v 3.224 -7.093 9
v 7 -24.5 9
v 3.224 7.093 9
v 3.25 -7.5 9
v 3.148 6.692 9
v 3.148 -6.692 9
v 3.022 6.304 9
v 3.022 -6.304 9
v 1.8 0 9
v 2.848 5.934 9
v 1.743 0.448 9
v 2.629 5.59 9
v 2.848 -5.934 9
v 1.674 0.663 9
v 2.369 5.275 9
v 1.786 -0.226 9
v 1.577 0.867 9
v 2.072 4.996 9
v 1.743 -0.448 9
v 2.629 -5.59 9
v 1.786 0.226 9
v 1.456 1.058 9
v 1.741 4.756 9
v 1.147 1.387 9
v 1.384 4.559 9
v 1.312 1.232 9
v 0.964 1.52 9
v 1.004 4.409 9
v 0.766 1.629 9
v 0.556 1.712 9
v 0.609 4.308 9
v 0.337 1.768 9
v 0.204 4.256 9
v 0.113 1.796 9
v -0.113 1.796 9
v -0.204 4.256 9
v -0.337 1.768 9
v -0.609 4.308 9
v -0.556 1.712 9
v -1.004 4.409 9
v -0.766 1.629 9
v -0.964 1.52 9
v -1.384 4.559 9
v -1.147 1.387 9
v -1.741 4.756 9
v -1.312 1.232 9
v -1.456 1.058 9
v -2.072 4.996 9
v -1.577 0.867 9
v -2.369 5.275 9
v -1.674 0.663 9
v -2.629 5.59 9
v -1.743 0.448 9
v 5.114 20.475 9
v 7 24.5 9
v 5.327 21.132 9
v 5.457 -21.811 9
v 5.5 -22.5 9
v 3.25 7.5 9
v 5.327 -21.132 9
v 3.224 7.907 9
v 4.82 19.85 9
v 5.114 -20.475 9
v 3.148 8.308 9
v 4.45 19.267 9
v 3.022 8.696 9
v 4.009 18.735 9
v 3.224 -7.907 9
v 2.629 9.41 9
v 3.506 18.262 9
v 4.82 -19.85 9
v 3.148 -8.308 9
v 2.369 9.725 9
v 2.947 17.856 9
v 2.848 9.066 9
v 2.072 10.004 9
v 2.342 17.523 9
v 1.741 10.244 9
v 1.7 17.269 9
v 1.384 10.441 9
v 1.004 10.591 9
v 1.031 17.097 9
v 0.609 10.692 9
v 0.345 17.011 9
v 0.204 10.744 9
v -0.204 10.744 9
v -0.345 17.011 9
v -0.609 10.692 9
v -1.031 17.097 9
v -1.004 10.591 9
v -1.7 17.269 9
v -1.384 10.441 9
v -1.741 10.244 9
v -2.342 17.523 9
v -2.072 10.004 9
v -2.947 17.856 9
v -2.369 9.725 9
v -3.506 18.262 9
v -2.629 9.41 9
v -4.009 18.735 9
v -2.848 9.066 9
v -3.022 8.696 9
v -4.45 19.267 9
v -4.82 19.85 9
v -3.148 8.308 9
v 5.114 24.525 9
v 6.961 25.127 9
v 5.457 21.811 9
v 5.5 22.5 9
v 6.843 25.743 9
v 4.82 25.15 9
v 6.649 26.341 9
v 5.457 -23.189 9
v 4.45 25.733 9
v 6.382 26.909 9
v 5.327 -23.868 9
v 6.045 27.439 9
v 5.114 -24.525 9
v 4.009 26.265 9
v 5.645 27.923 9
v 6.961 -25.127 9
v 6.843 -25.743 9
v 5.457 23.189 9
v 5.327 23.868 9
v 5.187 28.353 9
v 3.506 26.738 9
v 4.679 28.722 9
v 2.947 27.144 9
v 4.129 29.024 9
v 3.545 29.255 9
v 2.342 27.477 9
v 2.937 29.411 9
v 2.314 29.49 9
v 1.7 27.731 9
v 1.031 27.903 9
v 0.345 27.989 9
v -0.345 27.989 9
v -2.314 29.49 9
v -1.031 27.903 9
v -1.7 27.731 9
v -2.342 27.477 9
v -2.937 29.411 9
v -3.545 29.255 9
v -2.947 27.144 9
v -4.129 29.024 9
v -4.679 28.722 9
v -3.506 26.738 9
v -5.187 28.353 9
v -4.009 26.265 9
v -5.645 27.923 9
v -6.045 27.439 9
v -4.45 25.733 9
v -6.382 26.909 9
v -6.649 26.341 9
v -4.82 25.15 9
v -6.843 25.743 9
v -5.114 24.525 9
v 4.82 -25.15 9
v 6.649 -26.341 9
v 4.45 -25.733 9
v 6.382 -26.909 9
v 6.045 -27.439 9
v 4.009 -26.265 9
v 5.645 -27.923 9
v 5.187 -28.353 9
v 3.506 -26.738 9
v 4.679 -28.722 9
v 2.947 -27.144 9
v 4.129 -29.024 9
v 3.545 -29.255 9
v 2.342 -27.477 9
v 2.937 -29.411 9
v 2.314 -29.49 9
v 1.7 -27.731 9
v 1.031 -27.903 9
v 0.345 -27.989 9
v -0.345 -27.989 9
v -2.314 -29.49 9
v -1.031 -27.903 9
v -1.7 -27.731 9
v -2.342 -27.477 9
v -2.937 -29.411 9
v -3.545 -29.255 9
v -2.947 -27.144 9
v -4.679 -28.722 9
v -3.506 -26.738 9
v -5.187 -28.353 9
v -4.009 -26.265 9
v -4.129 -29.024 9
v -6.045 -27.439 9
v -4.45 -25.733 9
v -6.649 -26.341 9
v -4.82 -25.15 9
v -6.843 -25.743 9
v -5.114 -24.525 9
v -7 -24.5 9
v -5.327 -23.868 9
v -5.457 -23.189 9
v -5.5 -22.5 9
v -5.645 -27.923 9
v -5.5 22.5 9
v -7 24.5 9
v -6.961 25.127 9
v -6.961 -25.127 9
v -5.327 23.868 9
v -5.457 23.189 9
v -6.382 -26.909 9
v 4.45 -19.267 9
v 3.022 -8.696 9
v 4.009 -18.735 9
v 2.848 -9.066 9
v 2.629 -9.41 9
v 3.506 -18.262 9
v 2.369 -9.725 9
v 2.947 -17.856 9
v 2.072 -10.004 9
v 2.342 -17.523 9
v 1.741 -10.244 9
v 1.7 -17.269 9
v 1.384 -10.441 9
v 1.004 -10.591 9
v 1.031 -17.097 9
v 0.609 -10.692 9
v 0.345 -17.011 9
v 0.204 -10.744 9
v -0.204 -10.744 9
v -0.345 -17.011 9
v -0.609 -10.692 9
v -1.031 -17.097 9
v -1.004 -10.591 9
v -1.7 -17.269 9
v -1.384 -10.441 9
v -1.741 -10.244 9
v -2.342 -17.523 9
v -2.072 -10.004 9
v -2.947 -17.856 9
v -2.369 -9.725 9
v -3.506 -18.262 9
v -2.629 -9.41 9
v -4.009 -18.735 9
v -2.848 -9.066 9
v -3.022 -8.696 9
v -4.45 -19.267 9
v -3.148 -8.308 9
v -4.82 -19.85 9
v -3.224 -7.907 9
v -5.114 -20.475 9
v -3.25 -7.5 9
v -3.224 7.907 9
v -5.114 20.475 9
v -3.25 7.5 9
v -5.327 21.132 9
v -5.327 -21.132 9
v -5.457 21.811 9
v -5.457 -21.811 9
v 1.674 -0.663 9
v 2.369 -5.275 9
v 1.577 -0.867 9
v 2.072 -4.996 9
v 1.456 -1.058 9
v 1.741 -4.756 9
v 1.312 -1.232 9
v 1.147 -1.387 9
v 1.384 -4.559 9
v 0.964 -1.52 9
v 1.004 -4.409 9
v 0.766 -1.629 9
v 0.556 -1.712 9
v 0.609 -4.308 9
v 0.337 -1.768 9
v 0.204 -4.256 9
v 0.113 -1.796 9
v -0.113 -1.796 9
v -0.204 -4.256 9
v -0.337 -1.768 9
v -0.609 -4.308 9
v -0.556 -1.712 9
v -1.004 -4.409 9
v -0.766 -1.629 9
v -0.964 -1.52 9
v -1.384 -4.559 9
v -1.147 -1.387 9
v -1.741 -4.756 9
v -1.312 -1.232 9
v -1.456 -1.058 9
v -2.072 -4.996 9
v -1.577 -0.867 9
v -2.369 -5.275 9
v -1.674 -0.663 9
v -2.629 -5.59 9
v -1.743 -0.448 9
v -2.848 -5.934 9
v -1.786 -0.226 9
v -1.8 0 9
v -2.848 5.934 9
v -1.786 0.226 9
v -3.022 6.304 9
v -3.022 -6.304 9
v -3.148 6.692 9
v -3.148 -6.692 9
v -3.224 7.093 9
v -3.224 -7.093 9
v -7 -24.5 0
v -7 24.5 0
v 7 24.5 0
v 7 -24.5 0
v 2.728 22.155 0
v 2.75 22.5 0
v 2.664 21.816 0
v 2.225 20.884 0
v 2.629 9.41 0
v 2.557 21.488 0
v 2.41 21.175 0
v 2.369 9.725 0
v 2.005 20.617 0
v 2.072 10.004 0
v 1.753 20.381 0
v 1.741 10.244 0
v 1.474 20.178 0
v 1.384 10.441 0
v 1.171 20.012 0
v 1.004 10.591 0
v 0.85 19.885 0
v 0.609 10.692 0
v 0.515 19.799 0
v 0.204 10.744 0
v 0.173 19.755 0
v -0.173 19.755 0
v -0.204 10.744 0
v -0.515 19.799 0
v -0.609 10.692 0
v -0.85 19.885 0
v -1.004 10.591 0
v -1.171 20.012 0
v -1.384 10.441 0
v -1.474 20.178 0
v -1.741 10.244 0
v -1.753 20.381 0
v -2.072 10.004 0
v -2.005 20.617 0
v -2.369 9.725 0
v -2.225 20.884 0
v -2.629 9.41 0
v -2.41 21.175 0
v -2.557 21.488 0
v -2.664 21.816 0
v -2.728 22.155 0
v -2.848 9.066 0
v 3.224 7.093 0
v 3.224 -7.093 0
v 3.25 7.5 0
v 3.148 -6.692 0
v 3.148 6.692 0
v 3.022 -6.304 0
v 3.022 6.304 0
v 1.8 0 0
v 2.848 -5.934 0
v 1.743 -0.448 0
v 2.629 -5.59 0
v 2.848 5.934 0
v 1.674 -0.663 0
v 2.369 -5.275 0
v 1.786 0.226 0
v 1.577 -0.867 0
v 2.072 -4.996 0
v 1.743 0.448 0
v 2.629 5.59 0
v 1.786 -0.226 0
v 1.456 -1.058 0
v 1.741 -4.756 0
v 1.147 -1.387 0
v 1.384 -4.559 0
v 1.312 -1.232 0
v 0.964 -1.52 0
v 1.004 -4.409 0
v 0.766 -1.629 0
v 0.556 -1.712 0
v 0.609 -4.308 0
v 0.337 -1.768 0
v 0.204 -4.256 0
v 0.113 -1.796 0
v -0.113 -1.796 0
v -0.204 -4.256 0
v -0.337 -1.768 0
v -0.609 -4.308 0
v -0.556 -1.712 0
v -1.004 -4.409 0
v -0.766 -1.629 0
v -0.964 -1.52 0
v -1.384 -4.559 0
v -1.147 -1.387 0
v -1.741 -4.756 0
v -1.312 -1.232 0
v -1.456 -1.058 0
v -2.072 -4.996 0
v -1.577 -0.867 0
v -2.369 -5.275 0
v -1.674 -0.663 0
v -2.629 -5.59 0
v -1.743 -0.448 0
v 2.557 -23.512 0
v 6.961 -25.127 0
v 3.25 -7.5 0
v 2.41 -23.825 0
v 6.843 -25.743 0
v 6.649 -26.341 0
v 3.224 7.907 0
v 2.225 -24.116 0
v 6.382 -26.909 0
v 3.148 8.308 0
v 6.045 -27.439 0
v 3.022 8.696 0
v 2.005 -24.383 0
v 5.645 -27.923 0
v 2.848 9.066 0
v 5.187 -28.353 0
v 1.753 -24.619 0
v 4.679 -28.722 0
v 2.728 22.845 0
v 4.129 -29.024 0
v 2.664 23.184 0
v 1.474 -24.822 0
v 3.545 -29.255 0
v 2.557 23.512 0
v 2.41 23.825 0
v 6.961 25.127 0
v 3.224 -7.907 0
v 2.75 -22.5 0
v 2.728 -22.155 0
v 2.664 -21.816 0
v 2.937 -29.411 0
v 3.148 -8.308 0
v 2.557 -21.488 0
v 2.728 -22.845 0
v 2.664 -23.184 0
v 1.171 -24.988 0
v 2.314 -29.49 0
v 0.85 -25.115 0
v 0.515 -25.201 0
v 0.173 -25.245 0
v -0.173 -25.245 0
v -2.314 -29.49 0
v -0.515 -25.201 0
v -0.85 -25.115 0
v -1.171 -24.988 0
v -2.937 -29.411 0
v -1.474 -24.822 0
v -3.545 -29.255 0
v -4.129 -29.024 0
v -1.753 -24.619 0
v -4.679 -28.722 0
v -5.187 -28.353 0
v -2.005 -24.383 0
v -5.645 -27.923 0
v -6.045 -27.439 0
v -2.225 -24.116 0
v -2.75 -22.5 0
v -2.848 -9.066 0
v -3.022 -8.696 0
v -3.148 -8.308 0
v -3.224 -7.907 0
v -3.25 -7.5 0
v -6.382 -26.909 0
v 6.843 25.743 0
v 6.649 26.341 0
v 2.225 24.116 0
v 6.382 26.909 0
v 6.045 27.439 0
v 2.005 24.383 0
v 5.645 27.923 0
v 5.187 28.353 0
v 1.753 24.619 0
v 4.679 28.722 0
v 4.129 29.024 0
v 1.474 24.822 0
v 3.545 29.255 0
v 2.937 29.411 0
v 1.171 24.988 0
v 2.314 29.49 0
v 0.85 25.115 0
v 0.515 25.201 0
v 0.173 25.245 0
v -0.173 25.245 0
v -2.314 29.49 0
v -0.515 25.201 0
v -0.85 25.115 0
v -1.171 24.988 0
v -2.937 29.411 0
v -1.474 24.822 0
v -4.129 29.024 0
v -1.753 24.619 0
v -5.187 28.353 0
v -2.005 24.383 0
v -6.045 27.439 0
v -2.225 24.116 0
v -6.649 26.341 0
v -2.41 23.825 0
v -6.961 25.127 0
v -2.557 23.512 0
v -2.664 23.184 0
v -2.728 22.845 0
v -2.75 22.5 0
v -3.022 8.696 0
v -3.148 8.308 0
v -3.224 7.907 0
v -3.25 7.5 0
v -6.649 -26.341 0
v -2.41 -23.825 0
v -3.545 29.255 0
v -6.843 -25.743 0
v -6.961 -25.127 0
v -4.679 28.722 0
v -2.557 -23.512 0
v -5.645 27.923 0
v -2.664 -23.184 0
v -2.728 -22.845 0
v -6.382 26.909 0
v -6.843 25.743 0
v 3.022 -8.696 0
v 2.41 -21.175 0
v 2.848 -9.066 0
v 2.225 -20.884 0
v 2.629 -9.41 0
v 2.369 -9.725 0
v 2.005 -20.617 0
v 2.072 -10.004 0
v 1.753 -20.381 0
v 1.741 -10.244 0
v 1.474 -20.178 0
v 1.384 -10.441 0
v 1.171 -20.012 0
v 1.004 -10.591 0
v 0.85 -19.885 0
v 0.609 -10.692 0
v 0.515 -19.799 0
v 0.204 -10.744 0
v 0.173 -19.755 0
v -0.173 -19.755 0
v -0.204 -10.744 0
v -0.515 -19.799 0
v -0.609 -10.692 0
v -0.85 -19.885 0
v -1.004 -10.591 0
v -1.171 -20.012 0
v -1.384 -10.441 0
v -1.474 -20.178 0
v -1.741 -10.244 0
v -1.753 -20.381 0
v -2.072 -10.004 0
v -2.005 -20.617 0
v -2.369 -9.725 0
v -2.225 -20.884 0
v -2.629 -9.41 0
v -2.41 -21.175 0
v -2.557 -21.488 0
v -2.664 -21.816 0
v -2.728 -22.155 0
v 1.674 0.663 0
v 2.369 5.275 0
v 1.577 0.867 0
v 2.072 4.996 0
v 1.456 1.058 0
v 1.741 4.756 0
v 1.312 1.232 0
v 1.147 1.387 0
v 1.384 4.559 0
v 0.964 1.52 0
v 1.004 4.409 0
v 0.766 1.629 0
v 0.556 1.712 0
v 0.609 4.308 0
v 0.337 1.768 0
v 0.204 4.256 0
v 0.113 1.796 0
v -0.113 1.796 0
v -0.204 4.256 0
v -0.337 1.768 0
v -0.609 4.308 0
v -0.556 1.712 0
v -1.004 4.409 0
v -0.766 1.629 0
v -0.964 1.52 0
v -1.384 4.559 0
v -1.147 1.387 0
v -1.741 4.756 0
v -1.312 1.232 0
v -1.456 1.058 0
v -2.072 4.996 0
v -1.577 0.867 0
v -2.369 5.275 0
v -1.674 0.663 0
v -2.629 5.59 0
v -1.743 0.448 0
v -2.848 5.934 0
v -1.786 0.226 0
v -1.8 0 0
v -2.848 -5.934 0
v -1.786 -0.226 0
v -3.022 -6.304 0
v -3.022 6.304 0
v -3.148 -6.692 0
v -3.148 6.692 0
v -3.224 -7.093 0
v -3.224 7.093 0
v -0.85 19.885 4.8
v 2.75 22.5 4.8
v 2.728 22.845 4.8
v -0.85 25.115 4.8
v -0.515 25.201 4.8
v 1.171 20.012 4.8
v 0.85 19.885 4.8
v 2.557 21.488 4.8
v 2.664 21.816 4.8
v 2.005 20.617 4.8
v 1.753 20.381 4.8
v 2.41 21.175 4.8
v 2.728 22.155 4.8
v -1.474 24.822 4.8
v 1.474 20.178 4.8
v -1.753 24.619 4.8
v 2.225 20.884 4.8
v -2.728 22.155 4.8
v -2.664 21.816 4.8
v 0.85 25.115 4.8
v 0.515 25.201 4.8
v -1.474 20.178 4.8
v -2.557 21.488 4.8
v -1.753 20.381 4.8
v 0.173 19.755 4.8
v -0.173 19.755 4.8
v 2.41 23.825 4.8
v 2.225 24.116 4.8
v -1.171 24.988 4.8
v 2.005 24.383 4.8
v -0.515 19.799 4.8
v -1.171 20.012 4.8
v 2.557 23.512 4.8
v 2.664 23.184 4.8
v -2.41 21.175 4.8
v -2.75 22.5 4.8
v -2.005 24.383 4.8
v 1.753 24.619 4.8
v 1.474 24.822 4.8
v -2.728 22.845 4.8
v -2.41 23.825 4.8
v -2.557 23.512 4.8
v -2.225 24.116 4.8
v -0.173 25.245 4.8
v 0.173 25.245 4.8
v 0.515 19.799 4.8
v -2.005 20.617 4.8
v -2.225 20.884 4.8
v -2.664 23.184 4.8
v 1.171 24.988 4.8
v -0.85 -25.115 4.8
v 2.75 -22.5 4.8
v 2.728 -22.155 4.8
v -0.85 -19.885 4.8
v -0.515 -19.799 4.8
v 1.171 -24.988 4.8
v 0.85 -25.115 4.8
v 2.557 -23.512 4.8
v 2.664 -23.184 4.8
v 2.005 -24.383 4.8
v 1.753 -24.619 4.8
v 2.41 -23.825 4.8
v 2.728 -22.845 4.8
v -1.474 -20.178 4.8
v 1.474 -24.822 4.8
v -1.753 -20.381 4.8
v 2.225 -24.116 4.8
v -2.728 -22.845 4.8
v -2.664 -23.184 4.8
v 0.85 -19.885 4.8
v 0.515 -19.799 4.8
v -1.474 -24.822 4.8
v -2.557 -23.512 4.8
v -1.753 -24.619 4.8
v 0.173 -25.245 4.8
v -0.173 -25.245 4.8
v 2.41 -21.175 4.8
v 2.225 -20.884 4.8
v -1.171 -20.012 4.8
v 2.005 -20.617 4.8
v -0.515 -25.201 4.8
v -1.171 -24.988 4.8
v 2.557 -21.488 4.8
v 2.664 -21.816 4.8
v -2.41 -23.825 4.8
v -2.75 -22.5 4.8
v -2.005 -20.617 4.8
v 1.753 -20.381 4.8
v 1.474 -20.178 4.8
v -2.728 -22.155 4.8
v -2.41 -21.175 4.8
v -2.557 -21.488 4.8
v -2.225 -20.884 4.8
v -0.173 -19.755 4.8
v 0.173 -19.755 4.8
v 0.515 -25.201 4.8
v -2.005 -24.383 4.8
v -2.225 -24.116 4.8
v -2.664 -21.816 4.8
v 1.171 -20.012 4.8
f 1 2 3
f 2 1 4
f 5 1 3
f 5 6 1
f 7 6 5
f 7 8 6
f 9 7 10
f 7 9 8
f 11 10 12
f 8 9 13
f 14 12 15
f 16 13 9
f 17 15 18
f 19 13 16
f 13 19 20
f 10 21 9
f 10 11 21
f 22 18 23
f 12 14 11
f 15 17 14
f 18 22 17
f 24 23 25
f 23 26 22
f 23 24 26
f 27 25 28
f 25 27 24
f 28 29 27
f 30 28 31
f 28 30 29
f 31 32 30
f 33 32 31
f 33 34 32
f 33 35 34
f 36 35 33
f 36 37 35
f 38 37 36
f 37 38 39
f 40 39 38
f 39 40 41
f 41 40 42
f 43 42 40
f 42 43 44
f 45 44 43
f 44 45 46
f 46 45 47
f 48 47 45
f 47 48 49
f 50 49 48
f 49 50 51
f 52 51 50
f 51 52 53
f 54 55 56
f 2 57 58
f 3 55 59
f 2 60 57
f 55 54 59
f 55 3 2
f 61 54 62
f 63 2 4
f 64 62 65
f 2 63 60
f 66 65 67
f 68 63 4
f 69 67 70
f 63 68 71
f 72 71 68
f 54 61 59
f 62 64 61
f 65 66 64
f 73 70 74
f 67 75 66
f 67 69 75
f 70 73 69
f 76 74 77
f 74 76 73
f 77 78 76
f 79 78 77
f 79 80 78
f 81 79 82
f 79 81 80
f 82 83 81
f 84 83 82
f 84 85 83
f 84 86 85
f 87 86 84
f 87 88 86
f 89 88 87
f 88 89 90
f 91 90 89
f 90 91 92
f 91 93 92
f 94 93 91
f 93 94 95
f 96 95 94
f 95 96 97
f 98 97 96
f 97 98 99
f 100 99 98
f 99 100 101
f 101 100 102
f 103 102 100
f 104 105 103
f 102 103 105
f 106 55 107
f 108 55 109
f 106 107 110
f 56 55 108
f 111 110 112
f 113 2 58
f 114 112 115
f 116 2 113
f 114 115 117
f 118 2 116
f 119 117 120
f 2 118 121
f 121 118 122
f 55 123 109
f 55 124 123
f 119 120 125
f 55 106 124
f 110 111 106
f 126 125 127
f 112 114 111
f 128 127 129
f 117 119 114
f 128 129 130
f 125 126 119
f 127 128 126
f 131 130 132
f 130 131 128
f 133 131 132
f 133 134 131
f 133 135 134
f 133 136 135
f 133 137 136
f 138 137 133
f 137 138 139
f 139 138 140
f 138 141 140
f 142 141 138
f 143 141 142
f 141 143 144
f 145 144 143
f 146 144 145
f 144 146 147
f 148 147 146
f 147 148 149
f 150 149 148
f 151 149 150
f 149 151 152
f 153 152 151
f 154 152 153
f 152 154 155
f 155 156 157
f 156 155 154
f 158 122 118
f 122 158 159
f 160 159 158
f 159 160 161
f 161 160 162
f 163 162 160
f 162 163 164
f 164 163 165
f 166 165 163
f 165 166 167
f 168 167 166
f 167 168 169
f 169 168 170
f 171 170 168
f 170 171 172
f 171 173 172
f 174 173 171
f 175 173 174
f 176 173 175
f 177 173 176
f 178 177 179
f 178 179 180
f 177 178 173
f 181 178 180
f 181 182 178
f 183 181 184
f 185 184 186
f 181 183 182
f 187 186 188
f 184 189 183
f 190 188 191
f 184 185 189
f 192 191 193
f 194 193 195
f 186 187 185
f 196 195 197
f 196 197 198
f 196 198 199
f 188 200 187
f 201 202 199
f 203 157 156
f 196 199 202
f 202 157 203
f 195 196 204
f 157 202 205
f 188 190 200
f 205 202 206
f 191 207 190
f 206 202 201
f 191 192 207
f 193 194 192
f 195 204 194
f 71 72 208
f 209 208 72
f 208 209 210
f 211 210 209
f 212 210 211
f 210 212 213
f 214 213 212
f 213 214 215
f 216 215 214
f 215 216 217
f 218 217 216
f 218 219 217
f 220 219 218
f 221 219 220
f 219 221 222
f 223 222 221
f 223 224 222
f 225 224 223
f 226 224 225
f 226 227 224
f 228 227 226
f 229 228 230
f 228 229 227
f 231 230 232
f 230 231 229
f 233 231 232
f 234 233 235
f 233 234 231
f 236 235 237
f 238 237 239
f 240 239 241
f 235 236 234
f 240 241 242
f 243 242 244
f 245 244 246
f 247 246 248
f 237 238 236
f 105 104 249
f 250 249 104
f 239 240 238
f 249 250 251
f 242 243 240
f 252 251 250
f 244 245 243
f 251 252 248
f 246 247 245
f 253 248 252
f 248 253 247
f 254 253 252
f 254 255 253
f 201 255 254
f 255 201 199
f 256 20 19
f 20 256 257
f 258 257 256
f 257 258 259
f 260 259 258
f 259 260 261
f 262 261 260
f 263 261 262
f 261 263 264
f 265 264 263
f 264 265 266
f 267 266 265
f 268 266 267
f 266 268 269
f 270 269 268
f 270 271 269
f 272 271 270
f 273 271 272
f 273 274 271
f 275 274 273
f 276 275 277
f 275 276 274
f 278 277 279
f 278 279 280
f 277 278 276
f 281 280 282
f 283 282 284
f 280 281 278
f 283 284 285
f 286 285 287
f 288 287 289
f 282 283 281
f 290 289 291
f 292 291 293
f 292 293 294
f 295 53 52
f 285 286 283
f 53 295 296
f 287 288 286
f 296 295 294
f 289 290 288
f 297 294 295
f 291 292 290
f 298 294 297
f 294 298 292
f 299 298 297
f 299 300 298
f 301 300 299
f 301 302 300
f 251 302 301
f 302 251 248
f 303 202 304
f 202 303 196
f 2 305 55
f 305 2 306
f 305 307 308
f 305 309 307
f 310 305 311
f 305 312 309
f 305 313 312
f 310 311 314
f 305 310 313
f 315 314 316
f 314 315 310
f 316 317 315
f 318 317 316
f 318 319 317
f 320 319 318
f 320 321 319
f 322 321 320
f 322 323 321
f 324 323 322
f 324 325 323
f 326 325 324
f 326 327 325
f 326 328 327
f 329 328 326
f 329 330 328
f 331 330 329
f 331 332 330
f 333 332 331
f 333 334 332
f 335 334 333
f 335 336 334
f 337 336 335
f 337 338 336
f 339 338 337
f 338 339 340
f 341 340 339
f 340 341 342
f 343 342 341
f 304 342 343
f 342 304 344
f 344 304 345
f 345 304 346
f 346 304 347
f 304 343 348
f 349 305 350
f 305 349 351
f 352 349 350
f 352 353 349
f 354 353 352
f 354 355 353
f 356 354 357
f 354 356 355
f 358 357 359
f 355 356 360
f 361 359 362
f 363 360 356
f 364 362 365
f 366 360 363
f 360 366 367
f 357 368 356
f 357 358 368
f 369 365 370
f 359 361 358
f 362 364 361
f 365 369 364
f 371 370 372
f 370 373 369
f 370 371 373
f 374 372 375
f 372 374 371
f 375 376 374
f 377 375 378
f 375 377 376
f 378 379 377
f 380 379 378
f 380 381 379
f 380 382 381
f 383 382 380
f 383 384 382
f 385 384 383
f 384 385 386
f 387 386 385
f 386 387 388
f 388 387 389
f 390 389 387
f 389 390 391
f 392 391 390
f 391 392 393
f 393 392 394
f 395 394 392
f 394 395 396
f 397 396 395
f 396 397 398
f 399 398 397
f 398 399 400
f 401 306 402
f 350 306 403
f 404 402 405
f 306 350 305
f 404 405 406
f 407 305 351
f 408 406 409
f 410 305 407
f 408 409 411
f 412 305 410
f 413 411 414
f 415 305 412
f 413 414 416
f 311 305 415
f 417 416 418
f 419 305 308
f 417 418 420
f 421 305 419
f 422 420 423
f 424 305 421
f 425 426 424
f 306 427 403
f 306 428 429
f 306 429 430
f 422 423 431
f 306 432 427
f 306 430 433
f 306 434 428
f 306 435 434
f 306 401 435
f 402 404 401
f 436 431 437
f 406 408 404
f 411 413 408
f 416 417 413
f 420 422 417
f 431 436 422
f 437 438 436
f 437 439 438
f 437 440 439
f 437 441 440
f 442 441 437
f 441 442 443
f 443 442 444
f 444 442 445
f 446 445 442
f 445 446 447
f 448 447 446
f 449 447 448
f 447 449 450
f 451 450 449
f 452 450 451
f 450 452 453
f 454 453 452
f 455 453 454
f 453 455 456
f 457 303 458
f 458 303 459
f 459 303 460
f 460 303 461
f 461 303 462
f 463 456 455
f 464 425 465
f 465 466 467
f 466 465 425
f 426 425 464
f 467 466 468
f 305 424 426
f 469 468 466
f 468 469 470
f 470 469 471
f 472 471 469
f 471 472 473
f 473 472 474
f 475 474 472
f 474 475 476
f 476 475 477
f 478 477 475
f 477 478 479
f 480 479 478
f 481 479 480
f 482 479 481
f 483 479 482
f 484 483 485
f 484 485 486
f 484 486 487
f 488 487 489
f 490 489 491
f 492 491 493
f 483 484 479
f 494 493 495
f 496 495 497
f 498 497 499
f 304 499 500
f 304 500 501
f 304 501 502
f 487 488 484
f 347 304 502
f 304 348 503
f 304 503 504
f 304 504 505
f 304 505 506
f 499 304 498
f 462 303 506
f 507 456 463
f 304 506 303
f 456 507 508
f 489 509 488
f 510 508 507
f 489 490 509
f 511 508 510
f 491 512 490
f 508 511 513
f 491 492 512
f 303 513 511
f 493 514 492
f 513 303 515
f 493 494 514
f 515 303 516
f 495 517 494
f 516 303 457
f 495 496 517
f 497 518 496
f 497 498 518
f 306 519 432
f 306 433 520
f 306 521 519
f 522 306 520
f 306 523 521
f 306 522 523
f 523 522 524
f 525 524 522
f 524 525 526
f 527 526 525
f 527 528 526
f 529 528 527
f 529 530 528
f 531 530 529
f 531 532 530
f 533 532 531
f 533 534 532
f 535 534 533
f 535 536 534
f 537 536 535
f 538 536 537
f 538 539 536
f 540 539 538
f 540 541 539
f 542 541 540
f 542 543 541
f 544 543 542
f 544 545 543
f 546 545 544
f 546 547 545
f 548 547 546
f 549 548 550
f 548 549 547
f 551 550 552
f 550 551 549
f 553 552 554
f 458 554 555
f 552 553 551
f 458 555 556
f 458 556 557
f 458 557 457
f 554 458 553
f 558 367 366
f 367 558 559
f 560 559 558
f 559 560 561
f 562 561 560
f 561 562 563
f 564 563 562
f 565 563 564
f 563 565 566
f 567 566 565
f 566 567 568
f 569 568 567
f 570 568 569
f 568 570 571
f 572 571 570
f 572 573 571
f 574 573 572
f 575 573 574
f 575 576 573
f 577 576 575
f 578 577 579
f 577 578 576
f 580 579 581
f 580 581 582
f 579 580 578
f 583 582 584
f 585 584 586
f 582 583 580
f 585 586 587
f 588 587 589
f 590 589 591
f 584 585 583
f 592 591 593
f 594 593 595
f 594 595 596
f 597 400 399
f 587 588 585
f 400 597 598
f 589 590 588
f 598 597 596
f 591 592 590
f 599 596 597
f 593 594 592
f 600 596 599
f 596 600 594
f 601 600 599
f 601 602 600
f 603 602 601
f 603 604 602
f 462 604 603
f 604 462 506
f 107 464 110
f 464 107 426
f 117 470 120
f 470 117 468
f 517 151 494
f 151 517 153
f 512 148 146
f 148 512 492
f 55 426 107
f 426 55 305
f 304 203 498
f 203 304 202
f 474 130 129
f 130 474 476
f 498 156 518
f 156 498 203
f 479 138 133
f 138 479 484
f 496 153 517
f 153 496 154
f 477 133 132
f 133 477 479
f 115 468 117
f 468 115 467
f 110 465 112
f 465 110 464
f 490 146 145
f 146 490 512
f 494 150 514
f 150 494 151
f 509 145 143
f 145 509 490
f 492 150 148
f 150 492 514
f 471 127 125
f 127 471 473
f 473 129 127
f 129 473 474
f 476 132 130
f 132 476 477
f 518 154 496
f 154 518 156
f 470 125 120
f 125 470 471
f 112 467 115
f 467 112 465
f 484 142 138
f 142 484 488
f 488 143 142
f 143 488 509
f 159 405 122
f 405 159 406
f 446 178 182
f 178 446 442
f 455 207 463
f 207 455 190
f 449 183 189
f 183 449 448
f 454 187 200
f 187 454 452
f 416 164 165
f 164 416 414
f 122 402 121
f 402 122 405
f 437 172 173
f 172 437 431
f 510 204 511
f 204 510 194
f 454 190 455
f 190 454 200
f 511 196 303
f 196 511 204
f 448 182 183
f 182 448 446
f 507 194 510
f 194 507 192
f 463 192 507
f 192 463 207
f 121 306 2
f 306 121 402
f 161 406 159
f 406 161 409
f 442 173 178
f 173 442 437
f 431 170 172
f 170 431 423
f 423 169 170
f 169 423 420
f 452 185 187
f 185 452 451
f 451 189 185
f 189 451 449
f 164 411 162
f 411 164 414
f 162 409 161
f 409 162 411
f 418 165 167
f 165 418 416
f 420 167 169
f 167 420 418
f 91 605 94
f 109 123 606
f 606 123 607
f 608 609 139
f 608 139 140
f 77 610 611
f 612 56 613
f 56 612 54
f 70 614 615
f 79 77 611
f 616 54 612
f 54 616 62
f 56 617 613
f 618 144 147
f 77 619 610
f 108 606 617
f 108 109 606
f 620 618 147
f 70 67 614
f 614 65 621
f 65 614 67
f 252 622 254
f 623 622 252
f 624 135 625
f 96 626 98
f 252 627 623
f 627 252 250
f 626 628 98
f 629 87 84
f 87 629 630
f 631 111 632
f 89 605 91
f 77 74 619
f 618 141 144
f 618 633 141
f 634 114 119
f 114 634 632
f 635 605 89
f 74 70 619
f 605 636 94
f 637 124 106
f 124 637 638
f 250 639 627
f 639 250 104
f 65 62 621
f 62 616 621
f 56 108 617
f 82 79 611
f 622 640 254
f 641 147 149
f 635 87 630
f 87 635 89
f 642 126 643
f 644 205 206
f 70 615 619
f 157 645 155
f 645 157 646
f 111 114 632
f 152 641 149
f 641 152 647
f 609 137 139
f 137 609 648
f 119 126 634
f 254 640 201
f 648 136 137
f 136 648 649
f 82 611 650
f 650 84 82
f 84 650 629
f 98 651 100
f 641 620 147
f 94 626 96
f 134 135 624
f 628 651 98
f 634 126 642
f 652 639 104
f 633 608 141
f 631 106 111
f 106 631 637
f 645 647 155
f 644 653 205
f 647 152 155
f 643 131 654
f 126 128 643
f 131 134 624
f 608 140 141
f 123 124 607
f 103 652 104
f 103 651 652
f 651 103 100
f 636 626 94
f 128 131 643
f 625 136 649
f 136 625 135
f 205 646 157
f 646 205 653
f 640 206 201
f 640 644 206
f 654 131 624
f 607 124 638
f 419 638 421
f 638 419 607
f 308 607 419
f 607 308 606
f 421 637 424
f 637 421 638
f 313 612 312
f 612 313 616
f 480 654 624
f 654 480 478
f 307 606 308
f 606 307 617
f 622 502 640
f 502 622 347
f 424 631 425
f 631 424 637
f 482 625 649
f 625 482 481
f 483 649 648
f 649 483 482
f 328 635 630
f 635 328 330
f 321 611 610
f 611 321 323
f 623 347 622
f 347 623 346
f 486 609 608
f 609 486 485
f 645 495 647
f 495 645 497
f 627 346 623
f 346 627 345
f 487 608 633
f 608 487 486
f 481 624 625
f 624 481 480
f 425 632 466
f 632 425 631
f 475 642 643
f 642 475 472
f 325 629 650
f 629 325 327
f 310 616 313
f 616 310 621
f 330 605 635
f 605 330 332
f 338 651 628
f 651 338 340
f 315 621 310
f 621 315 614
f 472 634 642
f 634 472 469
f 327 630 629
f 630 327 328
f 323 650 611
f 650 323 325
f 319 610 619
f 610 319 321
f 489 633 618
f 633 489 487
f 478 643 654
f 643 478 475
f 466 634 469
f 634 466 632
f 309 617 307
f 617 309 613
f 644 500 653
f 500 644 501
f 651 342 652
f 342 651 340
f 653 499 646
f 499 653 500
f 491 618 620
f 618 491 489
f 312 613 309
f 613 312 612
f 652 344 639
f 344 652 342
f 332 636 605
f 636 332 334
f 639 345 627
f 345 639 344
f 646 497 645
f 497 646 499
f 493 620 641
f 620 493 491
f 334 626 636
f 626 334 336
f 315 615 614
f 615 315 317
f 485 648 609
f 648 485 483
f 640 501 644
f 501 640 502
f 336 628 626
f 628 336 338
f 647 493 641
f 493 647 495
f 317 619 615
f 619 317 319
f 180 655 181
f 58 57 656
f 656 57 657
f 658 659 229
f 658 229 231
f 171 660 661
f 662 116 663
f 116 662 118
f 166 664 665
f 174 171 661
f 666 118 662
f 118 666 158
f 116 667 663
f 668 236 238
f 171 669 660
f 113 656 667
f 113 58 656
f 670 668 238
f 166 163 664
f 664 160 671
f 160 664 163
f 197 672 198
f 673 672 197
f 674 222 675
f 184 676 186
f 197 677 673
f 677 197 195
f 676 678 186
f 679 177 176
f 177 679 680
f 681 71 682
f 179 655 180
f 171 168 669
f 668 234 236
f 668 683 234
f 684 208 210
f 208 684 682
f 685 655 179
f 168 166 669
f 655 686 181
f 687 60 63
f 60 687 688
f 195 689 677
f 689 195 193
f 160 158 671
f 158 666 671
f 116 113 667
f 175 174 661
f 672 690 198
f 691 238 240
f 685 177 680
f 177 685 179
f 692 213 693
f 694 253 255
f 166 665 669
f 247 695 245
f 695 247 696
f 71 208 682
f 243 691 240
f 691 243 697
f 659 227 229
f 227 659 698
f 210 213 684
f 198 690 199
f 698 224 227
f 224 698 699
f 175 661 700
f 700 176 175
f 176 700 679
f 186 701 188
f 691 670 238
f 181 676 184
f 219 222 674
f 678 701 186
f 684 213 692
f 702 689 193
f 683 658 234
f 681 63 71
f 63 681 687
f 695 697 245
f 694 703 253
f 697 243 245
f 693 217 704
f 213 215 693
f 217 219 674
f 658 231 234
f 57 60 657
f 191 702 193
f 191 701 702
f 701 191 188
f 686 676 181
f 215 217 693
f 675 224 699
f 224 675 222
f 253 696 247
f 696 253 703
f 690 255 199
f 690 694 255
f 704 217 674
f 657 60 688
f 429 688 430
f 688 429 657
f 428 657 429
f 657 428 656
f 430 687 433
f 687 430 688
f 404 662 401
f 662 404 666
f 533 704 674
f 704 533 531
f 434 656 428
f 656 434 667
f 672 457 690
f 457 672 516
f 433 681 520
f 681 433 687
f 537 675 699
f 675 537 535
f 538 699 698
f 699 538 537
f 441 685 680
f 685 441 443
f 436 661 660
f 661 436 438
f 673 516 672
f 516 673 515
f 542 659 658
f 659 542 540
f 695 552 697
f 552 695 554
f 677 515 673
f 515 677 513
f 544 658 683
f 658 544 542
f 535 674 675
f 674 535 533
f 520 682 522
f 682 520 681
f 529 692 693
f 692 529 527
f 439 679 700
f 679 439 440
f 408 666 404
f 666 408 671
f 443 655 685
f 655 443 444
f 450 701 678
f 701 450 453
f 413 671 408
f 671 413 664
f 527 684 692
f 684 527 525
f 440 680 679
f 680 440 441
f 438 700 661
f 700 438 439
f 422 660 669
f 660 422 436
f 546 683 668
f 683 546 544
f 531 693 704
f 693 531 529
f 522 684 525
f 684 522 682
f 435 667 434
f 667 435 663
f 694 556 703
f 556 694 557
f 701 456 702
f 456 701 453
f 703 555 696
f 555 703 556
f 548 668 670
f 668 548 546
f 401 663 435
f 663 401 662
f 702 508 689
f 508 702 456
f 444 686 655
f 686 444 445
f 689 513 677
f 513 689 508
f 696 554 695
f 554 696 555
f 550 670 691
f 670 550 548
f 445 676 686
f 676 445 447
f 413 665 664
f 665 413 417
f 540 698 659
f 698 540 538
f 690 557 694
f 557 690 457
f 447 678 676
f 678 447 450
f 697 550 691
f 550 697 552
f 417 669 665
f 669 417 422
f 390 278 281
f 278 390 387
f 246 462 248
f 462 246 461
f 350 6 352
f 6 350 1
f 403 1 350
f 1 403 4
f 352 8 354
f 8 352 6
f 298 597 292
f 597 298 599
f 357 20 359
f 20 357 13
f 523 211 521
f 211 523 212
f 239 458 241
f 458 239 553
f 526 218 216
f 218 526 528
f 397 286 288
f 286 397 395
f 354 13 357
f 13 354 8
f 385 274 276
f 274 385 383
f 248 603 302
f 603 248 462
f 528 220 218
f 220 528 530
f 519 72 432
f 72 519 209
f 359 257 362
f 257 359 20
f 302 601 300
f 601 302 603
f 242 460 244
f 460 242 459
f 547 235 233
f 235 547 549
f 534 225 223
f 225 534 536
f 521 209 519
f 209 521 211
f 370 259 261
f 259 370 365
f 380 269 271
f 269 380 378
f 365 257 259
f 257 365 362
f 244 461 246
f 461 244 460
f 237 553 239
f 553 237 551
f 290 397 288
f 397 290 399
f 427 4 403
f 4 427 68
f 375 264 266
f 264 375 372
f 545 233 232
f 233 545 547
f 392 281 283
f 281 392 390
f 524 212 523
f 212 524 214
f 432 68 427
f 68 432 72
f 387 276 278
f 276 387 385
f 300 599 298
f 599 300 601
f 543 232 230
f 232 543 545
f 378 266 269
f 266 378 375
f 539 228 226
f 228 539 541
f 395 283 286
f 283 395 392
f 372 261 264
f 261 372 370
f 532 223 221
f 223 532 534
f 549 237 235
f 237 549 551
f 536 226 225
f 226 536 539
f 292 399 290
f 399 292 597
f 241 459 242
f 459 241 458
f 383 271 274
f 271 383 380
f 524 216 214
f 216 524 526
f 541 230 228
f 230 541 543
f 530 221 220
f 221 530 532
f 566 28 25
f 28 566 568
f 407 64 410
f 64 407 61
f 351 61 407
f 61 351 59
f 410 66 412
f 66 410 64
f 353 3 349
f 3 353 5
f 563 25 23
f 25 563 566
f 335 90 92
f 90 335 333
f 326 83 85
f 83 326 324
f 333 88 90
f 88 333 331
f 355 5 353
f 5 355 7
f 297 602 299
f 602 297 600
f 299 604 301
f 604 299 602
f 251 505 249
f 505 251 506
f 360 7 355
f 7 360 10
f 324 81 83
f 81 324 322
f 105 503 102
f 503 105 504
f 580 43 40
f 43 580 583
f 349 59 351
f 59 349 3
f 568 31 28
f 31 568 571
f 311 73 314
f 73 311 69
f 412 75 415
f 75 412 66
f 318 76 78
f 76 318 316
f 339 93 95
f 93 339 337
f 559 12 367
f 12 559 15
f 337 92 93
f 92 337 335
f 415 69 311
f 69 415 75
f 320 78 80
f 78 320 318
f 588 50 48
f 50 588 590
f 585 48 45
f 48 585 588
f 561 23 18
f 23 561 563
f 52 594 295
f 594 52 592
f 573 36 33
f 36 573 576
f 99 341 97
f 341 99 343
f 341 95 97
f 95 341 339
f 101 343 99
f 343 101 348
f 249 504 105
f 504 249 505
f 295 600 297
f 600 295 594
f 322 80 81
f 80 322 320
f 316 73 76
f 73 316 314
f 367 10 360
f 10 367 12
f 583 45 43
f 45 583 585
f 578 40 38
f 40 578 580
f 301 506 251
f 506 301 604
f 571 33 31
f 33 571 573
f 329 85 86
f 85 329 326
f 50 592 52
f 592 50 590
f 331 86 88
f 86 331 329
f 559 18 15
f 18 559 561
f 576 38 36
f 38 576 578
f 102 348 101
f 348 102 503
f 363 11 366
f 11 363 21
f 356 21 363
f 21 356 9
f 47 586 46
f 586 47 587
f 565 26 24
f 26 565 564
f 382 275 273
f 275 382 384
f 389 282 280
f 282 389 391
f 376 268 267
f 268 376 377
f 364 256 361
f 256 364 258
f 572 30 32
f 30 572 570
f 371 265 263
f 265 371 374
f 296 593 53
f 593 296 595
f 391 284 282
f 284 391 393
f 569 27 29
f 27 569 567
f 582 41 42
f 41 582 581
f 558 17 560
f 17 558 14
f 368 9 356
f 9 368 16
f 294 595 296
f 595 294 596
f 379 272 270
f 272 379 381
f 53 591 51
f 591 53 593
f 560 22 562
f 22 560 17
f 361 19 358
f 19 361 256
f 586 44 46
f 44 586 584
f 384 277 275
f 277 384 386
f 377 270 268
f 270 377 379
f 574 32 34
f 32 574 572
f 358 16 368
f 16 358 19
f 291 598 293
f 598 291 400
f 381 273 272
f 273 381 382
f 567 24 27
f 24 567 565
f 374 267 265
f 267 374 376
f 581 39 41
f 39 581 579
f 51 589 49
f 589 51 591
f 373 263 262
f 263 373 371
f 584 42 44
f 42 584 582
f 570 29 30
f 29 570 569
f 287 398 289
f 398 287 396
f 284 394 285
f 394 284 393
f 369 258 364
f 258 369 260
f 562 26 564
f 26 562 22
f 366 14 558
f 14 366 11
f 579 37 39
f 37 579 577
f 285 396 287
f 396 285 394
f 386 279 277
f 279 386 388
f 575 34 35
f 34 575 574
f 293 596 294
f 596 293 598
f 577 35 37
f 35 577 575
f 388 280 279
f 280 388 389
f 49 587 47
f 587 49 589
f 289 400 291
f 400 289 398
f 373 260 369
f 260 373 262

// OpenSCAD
$fn = 50;


difference() {
	union() {
		hull() {
			translate(v = [-2.0000000000, 9.5000000000, 0]) {
				cylinder(h = 9, r = 5);
			}
			translate(v = [2.0000000000, 9.5000000000, 0]) {
				cylinder(h = 9, r = 5);
			}
			translate(v = [-2.0000000000, -9.5000000000, 0]) {
				cylinder(h = 9, r = 5);
			}
			translate(v = [2.0000000000, -9.5000000000, 0]) {
				cylinder(h = 9, r = 5);
			}
		}
		translate(v = [0.0000000000, 15.0000000000, 0]) {
			hull() {
				translate(v = [-2.0000000000, 9.5000000000, 0]) {
					cylinder(h = 9, r = 5);
				}
				translate(v = [2.0000000000, 9.5000000000, 0]) {
					cylinder(h = 9, r = 5);
				}
				translate(v = [-2.0000000000, -9.5000000000, 0]) {
					cylinder(h = 9, r = 5);
				}
				translate(v = [2.0000000000, -9.5000000000, 0]) {
					cylinder(h = 9, r = 5);
				}
			}
		}
		translate(v = [0.0000000000, 15.0000000000, 0]) {
			hull() {
				translate(v = [-2.0000000000, 9.5000000000, 0]) {
					cylinder(h = 9, r = 5);
				}
				translate(v = [2.0000000000, 9.5000000000, 0]) {
					cylinder(h = 9, r = 5);
				}
				translate(v = [-2.0000000000, -9.5000000000, 0]) {
					cylinder(h = 9, r = 5);
				}
				translate(v = [2.0000000000, -9.5000000000, 0]) {
					cylinder(h = 9, r = 5);
				}
			}
		}
		translate(v = [0.0000000000, -15.0000000000, 0]) {
			hull() {
				translate(v = [-2.0000000000, 9.5000000000, 0]) {
					cylinder(h = 9, r = 5);
				}
				translate(v = [2.0000000000, 9.5000000000, 0]) {
					cylinder(h = 9, r = 5);
				}
				translate(v = [-2.0000000000, -9.5000000000, 0]) {
					cylinder(h = 9, r = 5);
				}
				translate(v = [2.0000000000, -9.5000000000, 0]) {
					cylinder(h = 9, r = 5);
				}
			}
		}
		translate(v = [0.0000000000, -15.0000000000, 0]) {
			hull() {
				translate(v = [-2.0000000000, 9.5000000000, 0]) {
					cylinder(h = 9, r = 5);
				}
				translate(v = [2.0000000000, 9.5000000000, 0]) {
					cylinder(h = 9, r = 5);
				}
				translate(v = [-2.0000000000, -9.5000000000, 0]) {
					cylinder(h = 9, r = 5);
				}
				translate(v = [2.0000000000, -9.5000000000, 0]) {
					cylinder(h = 9, r = 5);
				}
			}
		}
	}
	union() {
		translate(v = [0.0000000000, 22.5000000000, 9]) {
			rotate(a = [0, 0, 0]) {
				difference() {
					union() {
						#translate(v = [0, 0, -9.0000000000]) {
							cylinder(h = 9, r = 2.2500000000);
						}
						#translate(v = [0, 0, -4.2000000000]) {
							cylinder(h = 4.2000000000, r1 = 2.7500000000, r2 = 5.5000000000);
						}
						#translate(v = [0, 0, -9.0000000000]) {
							cylinder(h = 9, r = 2.7500000000);
						}
						#translate(v = [0, 0, -9.0000000000]) {
							cylinder(h = 9, r = 2.2500000000);
						}
					}
					union();
				}
			}
		}
		translate(v = [0.0000000000, 22.5000000000, 9]) {
			rotate(a = [0, 0, 0]) {
				difference() {
					union() {
						#translate(v = [0, 0, -9.0000000000]) {
							cylinder(h = 9, r = 2.2500000000);
						}
						#translate(v = [0, 0, -4.2000000000]) {
							cylinder(h = 4.2000000000, r1 = 2.7500000000, r2 = 5.5000000000);
						}
						#translate(v = [0, 0, -9.0000000000]) {
							cylinder(h = 9, r = 2.7500000000);
						}
						#translate(v = [0, 0, -9.0000000000]) {
							cylinder(h = 9, r = 2.2500000000);
						}
					}
					union();
				}
			}
		}
		translate(v = [0.0000000000, -22.5000000000, 9]) {
			rotate(a = [0, 0, 0]) {
				difference() {
					union() {
						#translate(v = [0, 0, -9.0000000000]) {
							cylinder(h = 9, r = 2.2500000000);
						}
						#translate(v = [0, 0, -4.2000000000]) {
							cylinder(h = 4.2000000000, r1 = 2.7500000000, r2 = 5.5000000000);
						}
						#translate(v = [0, 0, -9.0000000000]) {
							cylinder(h = 9, r = 2.7500000000);
						}
						#translate(v = [0, 0, -9.0000000000]) {
							cylinder(h = 9, r = 2.2500000000);
						}
					}
					union();
				}
			}
		}
		translate(v = [0.0000000000, -22.5000000000, 9]) {
			rotate(a = [0, 0, 0]) {
				difference() {
					union() {
						#translate(v = [0, 0, -9.0000000000]) {
							cylinder(h = 9, r = 2.2500000000);
						}
						#translate(v = [0, 0, -4.2000000000]) {
							cylinder(h = 4.2000000000, r1 = 2.7500000000, r2 = 5.5000000000);
						}
						#translate(v = [0, 0, -9.0000000000]) {
							cylinder(h = 9, r = 2.7500000000);
						}
						#translate(v = [0, 0, -9.0000000000]) {
							cylinder(h = 9, r = 2.2500000000);
						}
					}
					union();
				}
			}
		}
		translate(v = [0.0000000000, -7.5000000000, 0]) {
			translate(v = [0, 0, -100]) {
				cylinder(h = 200, r = 3.2500000000);
			}
		}
		translate(v = [0.0000000000, 7.5000000000, 0]) {
			translate(v = [0, 0, -100]) {
				cylinder(h = 200, r = 3.2500000000);
			}
		}
		translate(v = [0.0000000000, -7.5000000000, 0]) {
			translate(v = [0, 0, -100]) {
				cylinder(h = 200, r = 1.8000000000);
			}
		}
		translate(v = [0, 0, -100]) {
			cylinder(h = 200, r = 1.8000000000);
		}
		translate(v = [0.0000000000, 7.5000000000, 0]) {
			translate(v = [0, 0, -100]) {
				cylinder(h = 200, r = 1.8000000000);
			}
		}
	}
}
